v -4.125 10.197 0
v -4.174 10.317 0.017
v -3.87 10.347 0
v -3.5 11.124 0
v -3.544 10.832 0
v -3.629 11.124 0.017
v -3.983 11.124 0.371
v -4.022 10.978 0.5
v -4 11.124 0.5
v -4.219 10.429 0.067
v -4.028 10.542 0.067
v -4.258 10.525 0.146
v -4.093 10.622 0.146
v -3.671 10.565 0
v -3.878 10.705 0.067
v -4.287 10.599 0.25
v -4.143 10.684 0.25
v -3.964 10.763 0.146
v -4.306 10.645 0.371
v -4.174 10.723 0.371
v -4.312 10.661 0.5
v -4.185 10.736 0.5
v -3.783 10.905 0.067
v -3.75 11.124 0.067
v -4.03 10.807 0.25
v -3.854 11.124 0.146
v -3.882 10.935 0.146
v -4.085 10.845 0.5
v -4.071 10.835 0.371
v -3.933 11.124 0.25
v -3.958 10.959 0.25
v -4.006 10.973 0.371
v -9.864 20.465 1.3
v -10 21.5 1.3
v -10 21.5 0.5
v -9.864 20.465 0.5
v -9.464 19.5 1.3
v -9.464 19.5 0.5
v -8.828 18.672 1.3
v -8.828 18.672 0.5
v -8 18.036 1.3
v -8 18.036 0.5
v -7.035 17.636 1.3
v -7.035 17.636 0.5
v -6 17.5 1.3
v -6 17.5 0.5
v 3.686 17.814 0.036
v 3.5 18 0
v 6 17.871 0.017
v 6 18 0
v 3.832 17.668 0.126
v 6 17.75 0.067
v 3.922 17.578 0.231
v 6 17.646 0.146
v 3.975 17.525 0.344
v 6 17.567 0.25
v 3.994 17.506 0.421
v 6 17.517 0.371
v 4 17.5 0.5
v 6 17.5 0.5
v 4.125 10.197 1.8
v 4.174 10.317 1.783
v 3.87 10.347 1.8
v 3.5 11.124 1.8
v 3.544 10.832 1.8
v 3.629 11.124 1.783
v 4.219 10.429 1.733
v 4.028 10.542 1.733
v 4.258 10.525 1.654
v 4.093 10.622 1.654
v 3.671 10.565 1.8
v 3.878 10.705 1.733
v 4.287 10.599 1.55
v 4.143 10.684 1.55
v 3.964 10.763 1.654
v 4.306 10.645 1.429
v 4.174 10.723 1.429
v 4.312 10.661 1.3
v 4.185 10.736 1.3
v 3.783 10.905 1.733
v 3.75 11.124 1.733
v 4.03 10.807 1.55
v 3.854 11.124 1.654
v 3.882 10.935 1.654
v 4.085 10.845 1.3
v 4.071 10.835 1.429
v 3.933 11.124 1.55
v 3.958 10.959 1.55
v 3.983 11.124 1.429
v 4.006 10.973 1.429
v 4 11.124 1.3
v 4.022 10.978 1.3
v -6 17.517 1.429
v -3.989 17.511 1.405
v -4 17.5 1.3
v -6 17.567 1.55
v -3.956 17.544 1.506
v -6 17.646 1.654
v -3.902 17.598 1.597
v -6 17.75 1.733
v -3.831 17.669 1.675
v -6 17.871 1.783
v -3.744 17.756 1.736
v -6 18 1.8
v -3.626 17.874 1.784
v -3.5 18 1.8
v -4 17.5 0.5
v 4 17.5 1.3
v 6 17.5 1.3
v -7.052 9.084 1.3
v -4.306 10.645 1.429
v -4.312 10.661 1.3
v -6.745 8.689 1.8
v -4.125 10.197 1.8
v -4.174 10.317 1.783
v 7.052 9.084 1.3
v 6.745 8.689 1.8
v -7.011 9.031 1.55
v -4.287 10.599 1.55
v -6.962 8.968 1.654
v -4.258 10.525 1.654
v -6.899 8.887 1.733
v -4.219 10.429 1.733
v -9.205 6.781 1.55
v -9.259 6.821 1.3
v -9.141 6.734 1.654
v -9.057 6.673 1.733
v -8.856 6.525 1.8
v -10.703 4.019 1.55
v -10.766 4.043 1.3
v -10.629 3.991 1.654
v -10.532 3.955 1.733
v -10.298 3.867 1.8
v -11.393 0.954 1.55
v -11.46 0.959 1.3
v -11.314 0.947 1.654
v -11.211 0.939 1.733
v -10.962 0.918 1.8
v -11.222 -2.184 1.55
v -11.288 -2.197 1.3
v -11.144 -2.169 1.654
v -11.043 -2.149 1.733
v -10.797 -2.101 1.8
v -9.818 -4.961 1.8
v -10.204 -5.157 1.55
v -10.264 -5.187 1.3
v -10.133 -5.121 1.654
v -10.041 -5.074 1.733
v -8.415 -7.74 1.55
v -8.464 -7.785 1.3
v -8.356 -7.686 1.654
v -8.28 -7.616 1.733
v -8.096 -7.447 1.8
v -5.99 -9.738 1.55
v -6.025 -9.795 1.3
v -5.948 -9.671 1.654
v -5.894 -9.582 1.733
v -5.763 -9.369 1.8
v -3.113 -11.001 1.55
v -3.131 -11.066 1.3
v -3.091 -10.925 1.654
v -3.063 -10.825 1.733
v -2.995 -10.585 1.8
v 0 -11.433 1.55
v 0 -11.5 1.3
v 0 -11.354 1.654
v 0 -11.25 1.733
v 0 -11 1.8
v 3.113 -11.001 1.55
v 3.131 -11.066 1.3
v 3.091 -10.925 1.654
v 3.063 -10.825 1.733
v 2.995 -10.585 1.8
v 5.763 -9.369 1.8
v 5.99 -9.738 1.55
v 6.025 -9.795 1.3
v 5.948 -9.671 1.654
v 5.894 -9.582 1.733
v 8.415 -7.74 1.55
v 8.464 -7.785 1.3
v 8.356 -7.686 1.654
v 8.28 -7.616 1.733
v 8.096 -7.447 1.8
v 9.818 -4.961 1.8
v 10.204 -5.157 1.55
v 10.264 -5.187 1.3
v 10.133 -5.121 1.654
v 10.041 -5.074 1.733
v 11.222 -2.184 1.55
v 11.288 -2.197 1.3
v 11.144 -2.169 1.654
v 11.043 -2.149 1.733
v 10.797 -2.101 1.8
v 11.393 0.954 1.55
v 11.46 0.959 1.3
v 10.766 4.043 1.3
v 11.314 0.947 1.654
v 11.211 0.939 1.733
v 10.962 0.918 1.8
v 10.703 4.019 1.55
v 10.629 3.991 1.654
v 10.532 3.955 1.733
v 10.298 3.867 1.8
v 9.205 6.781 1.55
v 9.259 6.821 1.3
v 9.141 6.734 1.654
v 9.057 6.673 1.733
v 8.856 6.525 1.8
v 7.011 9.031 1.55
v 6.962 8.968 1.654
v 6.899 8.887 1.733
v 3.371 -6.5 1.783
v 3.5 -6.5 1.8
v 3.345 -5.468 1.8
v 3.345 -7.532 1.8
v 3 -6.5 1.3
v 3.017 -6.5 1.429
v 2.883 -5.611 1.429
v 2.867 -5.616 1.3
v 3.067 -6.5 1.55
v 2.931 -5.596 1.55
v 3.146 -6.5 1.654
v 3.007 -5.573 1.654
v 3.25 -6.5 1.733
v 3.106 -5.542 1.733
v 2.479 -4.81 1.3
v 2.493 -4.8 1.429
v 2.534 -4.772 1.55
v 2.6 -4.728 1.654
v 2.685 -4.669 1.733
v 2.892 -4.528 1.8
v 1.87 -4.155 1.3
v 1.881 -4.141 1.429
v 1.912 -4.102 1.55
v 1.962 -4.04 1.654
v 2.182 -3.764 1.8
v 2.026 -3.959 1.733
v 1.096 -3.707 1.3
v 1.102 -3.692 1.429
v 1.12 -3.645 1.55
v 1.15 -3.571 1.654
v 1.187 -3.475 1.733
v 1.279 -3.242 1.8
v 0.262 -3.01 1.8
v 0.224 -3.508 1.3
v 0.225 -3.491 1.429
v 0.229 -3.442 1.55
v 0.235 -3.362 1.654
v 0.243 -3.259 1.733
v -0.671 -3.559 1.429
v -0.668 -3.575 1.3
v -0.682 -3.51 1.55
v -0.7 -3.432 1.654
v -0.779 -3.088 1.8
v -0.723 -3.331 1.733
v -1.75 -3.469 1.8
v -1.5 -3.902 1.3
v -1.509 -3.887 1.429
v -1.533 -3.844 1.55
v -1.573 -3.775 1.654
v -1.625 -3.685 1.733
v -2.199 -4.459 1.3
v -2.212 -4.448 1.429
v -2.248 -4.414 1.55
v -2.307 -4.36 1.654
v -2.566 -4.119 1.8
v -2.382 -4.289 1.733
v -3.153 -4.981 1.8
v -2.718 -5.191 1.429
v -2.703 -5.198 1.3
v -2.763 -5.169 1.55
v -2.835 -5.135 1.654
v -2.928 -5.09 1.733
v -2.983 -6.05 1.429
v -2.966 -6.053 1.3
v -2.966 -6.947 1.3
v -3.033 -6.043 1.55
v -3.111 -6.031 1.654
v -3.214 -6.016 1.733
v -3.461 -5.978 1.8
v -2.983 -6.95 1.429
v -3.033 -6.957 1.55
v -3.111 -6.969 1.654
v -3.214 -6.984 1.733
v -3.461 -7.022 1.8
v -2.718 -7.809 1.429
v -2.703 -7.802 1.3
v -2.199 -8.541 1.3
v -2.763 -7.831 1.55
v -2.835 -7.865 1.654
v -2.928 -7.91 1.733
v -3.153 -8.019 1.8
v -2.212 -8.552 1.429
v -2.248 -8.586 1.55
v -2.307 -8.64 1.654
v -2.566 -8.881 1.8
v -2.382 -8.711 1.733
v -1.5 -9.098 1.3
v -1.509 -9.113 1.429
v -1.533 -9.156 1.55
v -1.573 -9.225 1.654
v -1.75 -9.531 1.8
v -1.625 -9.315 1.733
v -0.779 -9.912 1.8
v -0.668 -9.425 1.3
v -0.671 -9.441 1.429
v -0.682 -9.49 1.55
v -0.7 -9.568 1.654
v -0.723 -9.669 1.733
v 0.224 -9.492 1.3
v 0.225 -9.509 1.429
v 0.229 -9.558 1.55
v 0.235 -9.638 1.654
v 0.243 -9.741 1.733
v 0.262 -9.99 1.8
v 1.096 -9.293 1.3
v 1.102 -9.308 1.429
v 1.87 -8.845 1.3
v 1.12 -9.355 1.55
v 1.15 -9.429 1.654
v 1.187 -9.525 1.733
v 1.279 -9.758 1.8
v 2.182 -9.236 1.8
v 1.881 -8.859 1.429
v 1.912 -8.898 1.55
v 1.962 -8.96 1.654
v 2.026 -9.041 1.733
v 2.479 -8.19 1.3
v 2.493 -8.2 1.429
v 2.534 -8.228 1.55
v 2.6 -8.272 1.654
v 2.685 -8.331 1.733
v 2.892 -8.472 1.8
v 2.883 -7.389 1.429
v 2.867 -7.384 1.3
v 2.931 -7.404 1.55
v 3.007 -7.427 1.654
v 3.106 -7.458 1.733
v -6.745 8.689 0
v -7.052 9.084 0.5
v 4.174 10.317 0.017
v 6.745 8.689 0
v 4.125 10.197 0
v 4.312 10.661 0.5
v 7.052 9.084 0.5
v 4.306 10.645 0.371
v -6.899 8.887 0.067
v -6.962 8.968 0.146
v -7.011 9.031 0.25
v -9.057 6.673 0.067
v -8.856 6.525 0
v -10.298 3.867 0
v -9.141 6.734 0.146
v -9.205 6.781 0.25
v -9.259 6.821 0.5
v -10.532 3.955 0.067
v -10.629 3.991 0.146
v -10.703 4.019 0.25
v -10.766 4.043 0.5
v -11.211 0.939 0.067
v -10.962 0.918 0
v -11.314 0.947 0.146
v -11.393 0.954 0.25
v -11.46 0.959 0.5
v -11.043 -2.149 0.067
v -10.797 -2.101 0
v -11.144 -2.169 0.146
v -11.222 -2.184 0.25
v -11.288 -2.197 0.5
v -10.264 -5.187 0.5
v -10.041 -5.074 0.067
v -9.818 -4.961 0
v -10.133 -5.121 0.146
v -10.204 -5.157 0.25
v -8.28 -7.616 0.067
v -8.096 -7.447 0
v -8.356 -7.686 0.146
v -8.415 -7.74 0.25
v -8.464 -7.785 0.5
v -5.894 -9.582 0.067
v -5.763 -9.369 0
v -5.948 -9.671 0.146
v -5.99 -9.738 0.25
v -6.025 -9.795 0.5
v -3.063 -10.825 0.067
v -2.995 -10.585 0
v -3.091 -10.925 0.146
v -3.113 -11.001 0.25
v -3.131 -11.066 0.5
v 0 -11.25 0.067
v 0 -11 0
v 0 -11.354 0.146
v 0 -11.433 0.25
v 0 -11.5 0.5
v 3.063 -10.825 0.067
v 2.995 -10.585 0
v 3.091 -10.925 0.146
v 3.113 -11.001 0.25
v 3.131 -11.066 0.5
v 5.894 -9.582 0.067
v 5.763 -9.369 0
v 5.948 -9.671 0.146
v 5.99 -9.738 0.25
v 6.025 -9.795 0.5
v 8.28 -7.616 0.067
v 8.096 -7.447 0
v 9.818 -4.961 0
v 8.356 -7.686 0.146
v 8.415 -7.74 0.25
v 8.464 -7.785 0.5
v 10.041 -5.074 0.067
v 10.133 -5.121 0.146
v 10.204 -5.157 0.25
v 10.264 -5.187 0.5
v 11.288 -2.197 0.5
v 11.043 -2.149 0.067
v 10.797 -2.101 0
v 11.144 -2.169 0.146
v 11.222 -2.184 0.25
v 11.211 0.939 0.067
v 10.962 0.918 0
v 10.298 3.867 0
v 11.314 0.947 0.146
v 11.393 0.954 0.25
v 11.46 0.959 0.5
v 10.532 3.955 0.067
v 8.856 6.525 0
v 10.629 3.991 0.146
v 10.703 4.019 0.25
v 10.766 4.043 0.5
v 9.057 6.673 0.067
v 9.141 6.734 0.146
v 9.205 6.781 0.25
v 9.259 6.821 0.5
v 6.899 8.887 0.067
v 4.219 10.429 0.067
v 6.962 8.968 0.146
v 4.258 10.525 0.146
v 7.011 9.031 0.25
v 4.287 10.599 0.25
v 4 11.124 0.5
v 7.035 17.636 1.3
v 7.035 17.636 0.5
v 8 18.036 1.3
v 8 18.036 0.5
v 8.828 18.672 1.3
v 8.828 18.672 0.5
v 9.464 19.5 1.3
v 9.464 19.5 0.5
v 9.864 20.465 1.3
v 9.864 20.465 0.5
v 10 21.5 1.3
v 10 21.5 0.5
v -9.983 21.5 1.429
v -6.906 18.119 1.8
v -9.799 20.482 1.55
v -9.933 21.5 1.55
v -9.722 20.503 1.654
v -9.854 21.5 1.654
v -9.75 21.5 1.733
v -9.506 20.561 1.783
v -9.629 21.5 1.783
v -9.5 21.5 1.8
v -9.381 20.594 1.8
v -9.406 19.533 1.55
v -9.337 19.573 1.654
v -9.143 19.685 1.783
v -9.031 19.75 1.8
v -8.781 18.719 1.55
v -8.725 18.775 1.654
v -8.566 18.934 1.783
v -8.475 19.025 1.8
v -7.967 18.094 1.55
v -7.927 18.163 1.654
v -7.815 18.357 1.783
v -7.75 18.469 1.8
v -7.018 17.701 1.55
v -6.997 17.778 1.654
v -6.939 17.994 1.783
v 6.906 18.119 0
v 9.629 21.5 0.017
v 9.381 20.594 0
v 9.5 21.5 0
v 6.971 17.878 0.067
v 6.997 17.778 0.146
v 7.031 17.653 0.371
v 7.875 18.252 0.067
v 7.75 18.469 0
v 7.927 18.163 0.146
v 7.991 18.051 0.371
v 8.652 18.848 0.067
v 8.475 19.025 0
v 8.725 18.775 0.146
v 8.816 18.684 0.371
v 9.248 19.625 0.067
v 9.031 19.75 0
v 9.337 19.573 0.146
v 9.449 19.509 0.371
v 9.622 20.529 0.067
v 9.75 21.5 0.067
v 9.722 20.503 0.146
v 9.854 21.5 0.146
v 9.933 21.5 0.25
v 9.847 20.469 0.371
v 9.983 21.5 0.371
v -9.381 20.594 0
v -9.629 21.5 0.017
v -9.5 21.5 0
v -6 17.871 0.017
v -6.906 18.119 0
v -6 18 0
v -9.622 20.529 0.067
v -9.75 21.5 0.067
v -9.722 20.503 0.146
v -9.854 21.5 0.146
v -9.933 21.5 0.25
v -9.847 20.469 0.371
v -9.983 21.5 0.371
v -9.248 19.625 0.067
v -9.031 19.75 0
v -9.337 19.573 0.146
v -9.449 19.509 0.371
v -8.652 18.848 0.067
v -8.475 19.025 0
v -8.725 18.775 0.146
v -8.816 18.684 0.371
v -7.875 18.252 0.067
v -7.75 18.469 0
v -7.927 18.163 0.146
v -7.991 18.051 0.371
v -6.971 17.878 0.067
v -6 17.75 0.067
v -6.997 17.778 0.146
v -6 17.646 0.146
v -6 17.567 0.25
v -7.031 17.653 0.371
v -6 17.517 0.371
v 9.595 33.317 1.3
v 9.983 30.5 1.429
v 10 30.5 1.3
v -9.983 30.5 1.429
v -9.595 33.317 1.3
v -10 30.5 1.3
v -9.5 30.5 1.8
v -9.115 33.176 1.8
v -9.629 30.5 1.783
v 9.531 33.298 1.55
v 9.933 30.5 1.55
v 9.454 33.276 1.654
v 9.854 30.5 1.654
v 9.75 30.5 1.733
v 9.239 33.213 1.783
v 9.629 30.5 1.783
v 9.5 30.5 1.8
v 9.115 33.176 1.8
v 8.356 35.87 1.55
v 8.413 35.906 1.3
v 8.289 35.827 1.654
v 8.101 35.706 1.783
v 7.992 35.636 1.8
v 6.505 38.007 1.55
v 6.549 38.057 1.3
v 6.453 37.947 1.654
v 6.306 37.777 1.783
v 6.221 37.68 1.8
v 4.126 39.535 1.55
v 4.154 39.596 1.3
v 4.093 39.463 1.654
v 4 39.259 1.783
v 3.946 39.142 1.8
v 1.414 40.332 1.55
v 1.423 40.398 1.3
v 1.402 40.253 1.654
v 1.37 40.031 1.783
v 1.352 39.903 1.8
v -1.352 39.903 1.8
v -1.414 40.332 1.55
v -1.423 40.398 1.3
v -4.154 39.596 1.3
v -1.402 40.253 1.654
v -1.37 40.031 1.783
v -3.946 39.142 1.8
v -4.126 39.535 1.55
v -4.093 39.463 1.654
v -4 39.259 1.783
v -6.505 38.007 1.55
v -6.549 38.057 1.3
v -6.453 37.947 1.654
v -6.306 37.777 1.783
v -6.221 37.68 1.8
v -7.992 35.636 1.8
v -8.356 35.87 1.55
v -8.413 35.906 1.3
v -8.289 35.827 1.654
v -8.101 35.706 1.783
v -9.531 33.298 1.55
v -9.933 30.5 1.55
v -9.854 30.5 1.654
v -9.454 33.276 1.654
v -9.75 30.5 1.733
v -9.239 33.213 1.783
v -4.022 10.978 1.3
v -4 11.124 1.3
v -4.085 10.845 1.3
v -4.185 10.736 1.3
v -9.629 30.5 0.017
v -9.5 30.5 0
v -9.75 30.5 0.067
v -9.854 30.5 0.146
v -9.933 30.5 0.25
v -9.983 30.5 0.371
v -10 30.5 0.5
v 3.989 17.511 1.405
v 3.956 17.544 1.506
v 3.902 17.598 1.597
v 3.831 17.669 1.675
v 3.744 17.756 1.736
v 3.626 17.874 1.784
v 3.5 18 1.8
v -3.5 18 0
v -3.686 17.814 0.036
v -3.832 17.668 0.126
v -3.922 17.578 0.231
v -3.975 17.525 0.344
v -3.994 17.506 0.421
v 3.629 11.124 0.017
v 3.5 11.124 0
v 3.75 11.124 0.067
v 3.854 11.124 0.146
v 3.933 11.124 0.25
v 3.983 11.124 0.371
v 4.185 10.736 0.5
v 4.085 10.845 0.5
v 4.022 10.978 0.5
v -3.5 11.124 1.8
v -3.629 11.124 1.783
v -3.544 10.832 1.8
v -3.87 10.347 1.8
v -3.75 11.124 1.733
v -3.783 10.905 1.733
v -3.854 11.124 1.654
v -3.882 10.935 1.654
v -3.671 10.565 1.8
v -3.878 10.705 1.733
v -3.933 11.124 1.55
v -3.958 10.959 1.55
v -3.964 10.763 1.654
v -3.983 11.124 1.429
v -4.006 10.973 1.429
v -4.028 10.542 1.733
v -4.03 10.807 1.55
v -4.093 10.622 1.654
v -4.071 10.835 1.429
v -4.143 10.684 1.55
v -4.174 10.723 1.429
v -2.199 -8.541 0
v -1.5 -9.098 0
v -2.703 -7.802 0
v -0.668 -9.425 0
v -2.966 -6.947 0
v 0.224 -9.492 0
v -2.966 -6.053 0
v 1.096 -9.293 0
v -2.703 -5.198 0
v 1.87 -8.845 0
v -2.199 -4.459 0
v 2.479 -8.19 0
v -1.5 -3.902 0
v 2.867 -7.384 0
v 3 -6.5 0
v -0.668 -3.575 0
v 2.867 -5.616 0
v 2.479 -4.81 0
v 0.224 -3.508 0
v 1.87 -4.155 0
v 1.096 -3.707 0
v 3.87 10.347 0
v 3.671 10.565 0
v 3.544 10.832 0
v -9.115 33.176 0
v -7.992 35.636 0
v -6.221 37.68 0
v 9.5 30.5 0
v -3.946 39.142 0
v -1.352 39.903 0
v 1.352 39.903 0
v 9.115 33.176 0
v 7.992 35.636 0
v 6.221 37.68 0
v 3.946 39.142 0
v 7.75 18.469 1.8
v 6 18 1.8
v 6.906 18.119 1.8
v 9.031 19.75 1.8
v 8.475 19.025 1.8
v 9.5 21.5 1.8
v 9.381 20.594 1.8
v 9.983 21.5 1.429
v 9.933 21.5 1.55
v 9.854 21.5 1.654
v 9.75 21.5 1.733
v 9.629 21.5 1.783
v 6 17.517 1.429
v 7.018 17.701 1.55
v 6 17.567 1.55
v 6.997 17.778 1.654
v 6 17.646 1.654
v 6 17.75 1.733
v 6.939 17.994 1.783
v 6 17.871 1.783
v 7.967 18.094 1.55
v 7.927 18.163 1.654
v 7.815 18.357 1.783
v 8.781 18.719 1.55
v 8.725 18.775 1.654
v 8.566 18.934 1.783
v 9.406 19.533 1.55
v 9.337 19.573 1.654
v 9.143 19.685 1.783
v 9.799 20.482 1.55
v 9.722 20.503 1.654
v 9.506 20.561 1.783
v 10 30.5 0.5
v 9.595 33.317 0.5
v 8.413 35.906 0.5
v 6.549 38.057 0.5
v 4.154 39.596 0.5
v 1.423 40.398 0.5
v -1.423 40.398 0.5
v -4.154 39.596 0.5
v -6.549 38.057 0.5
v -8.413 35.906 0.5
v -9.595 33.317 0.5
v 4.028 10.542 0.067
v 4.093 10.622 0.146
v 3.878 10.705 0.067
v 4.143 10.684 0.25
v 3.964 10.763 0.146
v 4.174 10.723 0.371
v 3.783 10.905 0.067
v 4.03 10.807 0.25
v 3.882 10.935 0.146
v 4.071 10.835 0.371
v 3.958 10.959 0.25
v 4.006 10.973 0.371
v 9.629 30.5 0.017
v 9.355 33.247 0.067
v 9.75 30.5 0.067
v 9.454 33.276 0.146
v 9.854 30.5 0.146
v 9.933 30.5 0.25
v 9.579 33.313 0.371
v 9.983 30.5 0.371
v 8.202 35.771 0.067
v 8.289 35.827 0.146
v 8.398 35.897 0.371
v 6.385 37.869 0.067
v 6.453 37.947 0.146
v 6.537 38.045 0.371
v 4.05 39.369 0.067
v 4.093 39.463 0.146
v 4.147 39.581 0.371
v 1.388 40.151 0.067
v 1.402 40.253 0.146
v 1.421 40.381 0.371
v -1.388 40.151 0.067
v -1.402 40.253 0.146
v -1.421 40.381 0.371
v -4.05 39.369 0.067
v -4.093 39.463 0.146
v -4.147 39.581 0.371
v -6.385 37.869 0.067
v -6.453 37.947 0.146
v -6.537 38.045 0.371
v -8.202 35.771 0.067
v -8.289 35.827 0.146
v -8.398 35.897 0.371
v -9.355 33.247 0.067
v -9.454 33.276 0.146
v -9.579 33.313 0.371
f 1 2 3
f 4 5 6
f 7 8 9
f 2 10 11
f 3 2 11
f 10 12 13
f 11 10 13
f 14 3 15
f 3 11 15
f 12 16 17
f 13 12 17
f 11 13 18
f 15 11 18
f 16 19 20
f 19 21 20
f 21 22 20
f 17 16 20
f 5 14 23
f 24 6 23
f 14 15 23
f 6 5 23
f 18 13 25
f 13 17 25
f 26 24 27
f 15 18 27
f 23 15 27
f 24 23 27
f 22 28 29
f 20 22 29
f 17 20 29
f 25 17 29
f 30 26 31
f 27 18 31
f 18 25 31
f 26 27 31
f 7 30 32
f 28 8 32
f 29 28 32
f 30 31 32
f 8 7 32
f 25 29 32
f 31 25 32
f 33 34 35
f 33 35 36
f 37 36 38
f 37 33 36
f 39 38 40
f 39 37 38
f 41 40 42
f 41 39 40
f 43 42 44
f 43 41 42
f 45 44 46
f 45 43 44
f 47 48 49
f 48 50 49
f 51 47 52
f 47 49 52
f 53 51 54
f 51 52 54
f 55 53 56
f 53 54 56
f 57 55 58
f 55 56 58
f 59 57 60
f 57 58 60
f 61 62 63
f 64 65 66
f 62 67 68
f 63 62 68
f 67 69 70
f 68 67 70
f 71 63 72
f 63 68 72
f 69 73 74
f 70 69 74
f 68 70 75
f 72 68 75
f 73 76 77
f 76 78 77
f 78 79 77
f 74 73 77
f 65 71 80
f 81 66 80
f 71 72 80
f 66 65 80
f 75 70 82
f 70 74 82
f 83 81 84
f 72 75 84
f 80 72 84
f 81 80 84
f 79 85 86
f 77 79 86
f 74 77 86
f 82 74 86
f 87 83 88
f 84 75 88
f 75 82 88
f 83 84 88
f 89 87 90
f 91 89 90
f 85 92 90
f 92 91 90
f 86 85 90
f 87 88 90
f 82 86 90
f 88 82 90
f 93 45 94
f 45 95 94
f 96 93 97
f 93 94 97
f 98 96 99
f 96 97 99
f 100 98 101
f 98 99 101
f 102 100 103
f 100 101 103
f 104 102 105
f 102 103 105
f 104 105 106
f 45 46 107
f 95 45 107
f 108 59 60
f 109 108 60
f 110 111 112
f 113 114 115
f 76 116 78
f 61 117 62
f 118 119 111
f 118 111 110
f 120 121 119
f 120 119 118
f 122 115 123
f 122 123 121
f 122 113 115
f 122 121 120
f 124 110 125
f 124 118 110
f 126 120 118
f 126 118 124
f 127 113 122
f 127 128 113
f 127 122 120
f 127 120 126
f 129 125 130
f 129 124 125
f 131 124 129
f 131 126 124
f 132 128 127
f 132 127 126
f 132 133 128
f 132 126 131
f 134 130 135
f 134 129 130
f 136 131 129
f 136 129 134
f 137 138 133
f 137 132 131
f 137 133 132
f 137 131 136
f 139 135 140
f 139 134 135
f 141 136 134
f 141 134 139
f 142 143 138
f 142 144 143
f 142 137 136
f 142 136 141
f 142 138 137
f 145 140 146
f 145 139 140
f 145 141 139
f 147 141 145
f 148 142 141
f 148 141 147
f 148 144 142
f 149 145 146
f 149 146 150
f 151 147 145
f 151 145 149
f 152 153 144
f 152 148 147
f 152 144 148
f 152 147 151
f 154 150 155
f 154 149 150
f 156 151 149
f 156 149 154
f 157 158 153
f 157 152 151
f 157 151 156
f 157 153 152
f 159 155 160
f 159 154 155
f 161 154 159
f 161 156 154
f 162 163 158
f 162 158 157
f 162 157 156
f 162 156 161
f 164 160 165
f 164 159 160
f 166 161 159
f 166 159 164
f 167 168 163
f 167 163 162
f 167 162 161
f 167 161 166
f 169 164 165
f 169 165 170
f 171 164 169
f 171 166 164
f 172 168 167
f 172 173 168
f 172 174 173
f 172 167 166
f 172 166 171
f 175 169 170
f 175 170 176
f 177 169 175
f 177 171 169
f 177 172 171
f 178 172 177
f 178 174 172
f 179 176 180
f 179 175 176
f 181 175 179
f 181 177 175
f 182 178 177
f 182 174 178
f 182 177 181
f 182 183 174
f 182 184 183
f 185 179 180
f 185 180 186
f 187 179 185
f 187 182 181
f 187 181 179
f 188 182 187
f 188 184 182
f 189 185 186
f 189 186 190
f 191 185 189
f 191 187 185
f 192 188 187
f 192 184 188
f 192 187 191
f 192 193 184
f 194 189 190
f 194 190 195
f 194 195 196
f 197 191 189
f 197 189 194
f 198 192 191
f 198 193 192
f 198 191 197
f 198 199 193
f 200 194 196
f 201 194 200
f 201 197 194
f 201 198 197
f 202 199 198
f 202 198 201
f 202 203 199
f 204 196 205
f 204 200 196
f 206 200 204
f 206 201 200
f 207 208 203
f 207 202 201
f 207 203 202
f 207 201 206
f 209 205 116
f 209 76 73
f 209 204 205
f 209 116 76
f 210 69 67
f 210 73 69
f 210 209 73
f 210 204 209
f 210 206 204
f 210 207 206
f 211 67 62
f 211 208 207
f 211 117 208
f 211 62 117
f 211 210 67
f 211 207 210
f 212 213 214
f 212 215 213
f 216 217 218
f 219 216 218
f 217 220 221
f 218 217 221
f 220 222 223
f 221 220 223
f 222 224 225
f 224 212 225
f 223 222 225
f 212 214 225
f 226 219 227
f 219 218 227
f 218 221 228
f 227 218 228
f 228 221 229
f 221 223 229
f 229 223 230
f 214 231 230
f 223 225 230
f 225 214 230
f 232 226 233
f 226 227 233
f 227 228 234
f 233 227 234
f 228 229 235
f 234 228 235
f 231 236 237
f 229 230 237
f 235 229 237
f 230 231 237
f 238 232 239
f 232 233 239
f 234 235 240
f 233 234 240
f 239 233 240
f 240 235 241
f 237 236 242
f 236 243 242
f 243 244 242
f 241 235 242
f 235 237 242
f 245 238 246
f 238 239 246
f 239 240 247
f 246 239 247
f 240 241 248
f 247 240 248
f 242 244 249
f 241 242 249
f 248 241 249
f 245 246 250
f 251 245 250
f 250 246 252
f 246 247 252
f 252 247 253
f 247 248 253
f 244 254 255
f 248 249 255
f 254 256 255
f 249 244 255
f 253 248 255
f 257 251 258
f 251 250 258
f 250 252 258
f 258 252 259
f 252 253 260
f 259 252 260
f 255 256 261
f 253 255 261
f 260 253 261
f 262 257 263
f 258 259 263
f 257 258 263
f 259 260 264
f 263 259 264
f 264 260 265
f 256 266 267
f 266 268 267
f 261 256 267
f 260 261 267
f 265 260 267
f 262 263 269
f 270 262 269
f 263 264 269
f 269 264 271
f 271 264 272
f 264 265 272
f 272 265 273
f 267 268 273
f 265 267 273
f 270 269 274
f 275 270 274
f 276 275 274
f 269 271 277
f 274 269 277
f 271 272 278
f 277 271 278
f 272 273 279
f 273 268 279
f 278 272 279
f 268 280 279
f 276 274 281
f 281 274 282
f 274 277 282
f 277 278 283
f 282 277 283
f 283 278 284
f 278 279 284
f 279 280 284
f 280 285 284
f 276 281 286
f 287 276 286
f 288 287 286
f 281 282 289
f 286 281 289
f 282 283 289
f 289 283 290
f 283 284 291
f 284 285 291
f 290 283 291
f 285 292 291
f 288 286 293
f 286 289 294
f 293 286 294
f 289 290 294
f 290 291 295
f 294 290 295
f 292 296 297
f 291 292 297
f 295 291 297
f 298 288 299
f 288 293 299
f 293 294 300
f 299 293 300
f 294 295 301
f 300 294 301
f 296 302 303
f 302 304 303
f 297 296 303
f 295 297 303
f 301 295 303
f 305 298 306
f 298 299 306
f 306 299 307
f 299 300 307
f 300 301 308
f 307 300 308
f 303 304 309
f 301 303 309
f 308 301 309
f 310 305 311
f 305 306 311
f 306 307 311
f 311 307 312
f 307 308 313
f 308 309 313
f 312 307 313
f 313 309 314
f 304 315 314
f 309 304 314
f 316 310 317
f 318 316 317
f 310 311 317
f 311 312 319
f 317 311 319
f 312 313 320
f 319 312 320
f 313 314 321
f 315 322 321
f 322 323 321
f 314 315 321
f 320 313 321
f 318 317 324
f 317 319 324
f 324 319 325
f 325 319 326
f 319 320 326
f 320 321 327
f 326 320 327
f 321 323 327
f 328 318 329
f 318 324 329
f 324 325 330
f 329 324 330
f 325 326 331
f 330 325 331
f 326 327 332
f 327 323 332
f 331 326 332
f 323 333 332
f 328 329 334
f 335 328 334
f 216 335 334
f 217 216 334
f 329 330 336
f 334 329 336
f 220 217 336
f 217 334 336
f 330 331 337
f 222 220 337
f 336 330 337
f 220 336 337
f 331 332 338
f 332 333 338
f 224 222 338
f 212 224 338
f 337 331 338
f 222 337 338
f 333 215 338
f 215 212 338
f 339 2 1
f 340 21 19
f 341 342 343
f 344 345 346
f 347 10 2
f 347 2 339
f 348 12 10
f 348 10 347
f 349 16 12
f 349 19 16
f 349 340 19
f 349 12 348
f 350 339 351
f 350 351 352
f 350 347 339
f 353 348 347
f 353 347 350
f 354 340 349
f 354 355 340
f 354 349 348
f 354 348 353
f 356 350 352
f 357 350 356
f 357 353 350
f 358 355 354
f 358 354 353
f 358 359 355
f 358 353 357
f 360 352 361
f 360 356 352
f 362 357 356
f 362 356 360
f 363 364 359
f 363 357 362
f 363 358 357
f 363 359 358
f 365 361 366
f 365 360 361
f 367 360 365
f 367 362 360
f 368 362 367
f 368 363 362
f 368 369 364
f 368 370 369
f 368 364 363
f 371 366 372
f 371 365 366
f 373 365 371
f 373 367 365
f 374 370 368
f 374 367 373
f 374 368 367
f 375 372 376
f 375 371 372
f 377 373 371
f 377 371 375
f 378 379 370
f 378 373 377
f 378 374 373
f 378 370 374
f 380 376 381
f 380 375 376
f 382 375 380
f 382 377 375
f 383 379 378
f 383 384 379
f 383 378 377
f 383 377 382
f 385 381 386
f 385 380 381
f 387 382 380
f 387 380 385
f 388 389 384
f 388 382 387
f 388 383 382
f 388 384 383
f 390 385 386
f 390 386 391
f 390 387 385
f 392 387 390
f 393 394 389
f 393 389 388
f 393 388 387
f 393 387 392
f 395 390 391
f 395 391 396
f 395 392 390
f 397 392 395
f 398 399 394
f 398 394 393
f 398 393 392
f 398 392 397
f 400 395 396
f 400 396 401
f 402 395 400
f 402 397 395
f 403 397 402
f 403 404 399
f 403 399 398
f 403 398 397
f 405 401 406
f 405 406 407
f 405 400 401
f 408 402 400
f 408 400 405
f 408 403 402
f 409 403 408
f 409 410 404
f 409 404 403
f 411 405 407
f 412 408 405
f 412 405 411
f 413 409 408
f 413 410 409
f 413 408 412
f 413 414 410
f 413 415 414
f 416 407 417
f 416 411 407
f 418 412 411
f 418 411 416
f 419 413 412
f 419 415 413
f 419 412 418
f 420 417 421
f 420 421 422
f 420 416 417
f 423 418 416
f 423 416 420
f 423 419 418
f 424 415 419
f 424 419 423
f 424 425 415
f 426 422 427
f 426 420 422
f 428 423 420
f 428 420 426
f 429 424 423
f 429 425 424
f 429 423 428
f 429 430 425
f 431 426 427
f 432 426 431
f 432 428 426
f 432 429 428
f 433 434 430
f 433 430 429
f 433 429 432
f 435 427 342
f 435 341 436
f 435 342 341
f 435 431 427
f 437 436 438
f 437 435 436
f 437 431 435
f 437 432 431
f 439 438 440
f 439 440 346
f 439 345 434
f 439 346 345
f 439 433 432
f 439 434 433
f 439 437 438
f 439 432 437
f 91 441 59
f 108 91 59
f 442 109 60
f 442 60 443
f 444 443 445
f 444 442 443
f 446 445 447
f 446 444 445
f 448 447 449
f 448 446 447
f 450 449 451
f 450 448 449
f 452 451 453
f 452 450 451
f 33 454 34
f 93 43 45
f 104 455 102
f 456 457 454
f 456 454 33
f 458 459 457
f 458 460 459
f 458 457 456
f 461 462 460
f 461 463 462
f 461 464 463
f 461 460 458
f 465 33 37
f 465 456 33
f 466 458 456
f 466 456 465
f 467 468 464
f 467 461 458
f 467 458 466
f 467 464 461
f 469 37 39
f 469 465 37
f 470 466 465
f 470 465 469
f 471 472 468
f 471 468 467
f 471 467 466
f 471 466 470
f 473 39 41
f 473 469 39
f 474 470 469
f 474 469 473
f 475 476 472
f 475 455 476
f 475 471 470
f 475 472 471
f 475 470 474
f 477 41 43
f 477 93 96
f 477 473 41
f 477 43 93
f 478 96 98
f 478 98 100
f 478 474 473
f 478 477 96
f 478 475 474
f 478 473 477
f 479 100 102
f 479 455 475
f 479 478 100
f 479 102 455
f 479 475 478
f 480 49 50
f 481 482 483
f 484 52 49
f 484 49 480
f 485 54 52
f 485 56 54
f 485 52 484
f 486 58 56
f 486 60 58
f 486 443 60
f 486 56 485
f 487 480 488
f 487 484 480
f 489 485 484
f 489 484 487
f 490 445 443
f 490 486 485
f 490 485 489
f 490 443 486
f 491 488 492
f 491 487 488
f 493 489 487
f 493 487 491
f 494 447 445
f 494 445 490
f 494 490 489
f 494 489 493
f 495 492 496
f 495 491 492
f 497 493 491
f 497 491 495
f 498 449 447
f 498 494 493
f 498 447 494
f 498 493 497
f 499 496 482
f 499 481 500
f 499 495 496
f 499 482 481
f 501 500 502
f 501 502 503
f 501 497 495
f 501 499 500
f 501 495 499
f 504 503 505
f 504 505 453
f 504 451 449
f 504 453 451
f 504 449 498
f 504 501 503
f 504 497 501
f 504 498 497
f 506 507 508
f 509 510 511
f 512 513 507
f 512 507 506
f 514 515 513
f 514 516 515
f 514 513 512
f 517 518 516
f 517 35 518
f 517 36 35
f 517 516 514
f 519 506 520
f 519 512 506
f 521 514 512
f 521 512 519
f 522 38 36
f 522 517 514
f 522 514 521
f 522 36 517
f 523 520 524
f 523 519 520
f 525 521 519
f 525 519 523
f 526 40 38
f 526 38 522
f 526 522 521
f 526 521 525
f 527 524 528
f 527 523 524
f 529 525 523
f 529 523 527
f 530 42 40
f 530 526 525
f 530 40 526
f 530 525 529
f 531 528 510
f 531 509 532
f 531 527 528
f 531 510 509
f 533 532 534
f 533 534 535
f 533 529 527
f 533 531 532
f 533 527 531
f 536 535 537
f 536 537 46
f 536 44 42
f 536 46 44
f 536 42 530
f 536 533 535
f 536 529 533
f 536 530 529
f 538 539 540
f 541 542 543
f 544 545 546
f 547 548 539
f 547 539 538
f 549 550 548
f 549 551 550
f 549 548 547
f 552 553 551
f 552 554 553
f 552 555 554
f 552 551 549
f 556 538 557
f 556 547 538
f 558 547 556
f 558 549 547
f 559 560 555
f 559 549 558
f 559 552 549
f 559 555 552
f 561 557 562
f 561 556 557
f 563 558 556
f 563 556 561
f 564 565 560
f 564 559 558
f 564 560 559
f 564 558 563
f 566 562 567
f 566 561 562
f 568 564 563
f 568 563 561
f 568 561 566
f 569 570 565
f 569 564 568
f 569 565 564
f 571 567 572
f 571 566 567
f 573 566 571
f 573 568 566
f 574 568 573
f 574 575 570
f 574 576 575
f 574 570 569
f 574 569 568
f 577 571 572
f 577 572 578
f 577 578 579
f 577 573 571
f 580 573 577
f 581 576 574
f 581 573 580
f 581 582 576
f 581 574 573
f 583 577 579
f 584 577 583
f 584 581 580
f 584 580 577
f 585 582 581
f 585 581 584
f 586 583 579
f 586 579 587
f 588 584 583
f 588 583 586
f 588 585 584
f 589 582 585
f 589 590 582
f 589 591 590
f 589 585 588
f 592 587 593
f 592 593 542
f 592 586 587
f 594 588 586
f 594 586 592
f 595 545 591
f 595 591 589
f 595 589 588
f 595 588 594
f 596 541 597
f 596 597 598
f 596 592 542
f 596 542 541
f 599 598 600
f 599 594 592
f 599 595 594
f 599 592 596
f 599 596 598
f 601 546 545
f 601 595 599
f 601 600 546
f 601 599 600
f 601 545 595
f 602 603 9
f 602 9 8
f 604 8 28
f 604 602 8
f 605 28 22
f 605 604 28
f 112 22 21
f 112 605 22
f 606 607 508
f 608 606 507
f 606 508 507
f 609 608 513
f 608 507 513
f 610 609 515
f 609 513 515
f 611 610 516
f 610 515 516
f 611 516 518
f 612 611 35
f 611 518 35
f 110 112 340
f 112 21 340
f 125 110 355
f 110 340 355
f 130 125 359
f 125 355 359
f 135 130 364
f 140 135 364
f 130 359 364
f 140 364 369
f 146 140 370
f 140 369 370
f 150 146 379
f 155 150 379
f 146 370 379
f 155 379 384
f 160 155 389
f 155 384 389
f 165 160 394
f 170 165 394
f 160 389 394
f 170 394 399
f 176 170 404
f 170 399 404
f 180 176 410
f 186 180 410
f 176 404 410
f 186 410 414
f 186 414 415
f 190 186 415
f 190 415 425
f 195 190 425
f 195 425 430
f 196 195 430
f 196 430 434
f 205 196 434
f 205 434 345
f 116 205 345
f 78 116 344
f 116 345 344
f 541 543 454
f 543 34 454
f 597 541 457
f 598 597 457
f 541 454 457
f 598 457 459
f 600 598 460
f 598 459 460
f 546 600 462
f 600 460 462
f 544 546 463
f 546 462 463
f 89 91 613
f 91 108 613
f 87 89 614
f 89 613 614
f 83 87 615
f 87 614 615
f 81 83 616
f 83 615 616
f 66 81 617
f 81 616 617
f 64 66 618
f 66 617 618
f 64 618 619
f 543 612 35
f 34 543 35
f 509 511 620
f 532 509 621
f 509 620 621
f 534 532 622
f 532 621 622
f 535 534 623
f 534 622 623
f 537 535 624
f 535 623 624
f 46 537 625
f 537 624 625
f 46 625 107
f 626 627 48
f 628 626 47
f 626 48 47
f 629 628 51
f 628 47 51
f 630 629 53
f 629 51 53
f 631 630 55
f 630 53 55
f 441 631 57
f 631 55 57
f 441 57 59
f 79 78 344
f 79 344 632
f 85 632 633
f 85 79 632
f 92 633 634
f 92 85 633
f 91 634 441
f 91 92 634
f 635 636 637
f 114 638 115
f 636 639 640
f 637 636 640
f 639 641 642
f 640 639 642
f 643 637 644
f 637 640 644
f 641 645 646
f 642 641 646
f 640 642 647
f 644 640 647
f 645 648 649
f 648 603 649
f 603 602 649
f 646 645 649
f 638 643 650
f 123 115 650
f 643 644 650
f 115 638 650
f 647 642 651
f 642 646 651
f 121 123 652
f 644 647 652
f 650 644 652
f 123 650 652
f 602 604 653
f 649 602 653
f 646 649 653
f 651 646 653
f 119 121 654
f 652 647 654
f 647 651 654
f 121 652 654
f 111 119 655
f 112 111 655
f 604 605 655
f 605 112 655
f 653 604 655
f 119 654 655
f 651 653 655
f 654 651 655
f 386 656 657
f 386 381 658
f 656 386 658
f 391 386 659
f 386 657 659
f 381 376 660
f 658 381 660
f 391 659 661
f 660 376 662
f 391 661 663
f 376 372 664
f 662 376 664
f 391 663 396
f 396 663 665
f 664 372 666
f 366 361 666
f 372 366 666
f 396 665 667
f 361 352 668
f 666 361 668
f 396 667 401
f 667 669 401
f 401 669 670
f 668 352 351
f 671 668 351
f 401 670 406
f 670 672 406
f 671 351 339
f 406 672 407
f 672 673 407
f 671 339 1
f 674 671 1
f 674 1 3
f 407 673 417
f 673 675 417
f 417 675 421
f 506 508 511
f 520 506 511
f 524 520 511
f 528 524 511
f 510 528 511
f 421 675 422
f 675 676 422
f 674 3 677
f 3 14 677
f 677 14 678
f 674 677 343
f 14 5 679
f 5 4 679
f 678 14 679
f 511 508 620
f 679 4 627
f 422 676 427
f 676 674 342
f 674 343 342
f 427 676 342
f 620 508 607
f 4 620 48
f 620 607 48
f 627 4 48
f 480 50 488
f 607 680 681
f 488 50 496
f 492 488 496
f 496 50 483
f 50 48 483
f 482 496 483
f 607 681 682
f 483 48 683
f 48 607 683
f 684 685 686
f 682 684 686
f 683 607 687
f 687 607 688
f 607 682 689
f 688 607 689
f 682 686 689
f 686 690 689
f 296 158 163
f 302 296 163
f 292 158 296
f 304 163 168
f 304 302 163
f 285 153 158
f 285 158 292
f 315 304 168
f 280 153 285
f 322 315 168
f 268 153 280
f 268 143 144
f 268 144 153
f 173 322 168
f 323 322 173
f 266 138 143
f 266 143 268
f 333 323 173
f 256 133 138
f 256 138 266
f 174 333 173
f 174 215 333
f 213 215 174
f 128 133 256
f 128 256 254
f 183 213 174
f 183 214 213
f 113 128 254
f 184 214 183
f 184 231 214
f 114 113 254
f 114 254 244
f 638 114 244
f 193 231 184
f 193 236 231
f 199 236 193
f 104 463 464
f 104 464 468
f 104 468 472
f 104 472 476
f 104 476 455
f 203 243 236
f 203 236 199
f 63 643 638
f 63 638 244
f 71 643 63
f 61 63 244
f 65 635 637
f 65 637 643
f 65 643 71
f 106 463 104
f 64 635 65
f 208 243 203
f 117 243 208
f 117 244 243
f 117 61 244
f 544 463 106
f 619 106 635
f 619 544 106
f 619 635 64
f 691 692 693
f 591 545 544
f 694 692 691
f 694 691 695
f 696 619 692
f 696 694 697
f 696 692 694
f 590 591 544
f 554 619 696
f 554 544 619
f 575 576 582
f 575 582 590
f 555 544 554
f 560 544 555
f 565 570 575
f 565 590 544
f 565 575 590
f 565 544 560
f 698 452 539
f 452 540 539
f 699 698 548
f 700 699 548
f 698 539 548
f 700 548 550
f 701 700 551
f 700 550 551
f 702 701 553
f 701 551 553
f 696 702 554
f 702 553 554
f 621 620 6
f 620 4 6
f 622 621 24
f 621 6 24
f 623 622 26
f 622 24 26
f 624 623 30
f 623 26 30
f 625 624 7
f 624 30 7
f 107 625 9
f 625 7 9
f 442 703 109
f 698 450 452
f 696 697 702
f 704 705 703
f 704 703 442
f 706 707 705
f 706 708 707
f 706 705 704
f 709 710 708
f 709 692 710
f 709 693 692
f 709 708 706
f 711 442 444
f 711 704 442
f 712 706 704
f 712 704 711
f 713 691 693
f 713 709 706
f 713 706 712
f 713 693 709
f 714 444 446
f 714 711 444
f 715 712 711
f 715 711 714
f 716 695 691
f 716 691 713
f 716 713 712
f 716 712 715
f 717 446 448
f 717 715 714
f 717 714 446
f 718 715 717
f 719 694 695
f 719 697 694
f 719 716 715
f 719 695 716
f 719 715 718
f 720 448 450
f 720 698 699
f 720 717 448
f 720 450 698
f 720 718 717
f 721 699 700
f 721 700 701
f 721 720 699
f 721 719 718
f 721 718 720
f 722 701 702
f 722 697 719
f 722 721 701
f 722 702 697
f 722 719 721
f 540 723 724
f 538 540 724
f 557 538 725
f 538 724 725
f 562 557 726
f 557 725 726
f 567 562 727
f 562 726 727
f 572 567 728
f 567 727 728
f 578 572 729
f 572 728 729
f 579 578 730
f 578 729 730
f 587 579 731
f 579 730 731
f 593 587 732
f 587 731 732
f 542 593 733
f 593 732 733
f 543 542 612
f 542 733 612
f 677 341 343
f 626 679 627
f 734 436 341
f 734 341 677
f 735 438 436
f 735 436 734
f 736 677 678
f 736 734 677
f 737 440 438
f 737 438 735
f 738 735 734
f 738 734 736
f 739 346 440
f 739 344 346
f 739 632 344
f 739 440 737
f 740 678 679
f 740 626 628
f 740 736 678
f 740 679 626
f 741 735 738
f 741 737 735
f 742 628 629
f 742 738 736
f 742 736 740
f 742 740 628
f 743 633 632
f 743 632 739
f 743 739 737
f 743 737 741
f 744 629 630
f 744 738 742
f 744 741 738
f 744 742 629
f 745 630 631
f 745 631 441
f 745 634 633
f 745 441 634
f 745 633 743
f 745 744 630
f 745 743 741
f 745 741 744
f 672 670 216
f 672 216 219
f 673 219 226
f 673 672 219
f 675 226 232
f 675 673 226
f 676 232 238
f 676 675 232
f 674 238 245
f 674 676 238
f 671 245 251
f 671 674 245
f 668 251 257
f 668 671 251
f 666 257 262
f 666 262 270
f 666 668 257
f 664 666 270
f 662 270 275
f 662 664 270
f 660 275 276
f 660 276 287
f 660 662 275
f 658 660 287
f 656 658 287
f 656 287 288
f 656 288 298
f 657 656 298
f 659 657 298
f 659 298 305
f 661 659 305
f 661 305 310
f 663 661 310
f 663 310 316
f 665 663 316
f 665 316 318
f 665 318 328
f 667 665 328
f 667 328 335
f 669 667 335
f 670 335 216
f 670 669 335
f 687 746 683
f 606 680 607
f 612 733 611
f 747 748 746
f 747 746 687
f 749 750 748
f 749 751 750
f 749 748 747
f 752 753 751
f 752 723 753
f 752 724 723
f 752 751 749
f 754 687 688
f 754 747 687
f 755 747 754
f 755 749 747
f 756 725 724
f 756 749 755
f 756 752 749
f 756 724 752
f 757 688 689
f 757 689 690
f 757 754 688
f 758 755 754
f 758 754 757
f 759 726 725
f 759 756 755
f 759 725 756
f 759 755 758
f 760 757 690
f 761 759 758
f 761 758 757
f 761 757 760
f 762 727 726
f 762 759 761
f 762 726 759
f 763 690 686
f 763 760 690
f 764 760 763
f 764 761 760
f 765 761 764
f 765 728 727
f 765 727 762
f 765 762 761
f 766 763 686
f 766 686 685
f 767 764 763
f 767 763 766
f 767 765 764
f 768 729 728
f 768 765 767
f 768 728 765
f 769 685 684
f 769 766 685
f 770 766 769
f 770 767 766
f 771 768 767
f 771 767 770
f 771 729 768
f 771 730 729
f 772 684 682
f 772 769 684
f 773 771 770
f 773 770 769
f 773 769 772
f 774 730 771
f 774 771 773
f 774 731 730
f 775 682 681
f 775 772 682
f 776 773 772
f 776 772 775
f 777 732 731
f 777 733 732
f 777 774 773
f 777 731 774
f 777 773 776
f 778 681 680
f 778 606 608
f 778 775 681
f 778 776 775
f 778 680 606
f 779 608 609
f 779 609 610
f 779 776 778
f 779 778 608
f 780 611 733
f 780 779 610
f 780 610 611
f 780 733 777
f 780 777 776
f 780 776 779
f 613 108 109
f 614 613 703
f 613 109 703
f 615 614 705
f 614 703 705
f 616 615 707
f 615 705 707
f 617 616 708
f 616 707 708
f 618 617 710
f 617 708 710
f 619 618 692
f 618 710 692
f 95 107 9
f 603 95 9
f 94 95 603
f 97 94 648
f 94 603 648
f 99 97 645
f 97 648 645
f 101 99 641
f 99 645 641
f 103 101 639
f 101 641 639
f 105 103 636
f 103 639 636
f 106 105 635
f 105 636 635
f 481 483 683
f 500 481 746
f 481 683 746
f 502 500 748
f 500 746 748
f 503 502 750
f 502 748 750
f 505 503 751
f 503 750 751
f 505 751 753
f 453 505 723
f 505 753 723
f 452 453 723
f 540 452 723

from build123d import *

# Parameters (mm, degrees)
F0_R     = 3
F1_DEPTH = 1.8
F2_R     = 4
F3_R     = 4
F4_R     = 0.5


with BuildPart() as f1:
    # F0 (on Top) → F1 (new body)
    with BuildSketch(Plane.XY):
        with BuildLine():
            Line((-4, 17.5), (-4, 10.7819293264))
            ThreePointArc((-4, 10.7819293264), (0, -11.5), (4, 10.7819293264))
            Line((4, 10.7819293264), (4, 17.5))
            Line((4, 17.5), (10, 17.5))
            Line((10, 17.5), (10, 30.5))
            ThreePointArc((10, 30.5), (0, 40.5), (-10, 30.5))
            Line((-10, 30.5), (-10, 17.5))
            Line((-10, 17.5), (-4, 17.5))
        make_face()
        with Locations((0, -6.5)):
            Circle(F0_R, mode=Mode.SUBTRACT)
    extrude(amount=F1_DEPTH)

    # F2
    f2_edges = [f1.edges().sort_by_distance(p)[0] for p in [
        (10, 17.5, 0.9),
    ]]
    fillet(f2_edges, radius=F2_R)

    # F3
    f3_edges = [f1.edges().sort_by_distance(p)[0] for p in [
        (-10, 17.5, 0.9),
    ]]
    fillet(f3_edges, radius=F3_R)

    # F4
    f4_edges = [f1.edges().sort_by_distance(p)[0] for p in [
        (-10, 26, 1.8),
        (-8.828427, 18.671573, 1.8),
        (0, 40.5, 1.8),
        (-5, 17.5, 1.8),
        (10, 26, 1.8),
        (-4, 14.140965, 1.8),
        (8.828427, 18.671573, 1.8),
        (0, -11.5, 1.8),
        (5, 17.5, 1.8),
        (4, 14.140965, 1.8),
        (-3, -6.5, 1.8),
        (-4, 10.781929, 0.9),
        (4, 10.781929, 0.9),
        (0, -11.5, 0),
        (10, 26, 0),
        (8.828427, 18.671573, 0),
        (5, 17.5, 0),
        (-10, 26, 0),
        (-8.828427, 18.671573, 0),
        (0, 40.5, 0),
        (-5, 17.5, 0),
        (-4, 14.140965, 0),
        (4, 14.140965, 0),
    ]]
    fillet(f4_edges, radius=F4_R)


solid = f1.part
